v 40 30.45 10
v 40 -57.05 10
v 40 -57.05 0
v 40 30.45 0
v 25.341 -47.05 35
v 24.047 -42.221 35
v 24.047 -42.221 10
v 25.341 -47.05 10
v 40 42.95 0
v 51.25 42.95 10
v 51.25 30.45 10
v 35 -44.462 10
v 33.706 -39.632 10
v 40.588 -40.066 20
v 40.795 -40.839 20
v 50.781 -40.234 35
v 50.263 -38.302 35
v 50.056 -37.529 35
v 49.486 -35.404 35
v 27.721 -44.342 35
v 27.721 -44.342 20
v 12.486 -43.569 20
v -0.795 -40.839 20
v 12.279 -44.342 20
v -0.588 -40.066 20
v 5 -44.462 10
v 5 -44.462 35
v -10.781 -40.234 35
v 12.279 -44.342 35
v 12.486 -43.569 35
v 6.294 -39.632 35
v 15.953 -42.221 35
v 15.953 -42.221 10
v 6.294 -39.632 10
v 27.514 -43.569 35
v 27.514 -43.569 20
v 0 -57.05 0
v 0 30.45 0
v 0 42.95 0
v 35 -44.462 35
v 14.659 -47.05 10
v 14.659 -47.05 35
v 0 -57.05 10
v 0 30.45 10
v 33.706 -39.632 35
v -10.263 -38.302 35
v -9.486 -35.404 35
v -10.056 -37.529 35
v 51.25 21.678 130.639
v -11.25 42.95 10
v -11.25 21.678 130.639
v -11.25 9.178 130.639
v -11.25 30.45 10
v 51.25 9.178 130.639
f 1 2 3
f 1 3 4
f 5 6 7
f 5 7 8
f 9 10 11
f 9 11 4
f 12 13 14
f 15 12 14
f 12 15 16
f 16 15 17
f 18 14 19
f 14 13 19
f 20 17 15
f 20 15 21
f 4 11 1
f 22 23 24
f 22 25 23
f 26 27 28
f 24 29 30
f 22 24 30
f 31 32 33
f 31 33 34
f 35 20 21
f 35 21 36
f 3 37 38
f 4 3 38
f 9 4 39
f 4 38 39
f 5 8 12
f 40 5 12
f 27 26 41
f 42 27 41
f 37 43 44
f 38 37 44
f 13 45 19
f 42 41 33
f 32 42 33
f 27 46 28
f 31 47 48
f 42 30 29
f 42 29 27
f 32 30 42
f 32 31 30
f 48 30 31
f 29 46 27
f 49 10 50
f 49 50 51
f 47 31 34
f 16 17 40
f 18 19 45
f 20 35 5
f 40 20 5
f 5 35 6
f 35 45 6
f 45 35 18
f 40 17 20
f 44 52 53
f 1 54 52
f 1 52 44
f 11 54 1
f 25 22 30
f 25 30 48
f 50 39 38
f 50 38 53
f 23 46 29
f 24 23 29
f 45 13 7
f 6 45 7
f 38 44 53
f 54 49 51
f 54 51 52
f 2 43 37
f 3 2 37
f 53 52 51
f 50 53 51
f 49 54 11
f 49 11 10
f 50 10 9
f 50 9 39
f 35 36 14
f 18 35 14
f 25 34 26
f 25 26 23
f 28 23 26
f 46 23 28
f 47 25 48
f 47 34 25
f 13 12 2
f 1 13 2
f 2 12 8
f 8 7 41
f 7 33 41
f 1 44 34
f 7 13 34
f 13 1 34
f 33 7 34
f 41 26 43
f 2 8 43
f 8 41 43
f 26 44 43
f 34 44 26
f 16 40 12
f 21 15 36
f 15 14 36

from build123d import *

# Parameters (mm, degrees)
F1_DEPTH  = 40
F4_DEPTH  = 62.5
F6_DEPTH  = 12.5
F8_DEPTH  = 25
F10_DEPTH = 5
F12_DEPTH = 15


# Not quite as in the source:
# - a pattern or mirror of a feature is missing from the dataset's text; its kind, count and spacing are read off the source's solid


with BuildPart() as f1:
    # F0 (on Right) → F1 (new body)
    with BuildSketch(Plane.YZ):
        Polygon((-57.0501919146, 0), (0, 0), (42.9498080854, 0), (42.9498080854, 10), (-57.0501919146, 10), align=None)
    extrude(amount=F1_DEPTH)

    # F3 (on offset) → F4 (join)
    with BuildSketch(Plane.YZ.offset(51.25)):
        Polygon((9.1779063212, 130.638949744), (30.4498080854, 10), (42.9498080854, 10), (21.6779063212, 130.638949744), align=None)
    extrude(amount=-F4_DEPTH)

    # F5 (on face) → F6 (join)
    with BuildSketch(Plane(origin=(0, 42.9498080854, 0), x_dir=(-1, 0, 0), z_dir=(0, 1, 0))):
        Polygon((11.25, 10), (0, 10), (0, 0), align=None)
        Polygon((-40, 0), (-40, 10), (-51.25, 10), align=None)
    extrude(amount=-F6_DEPTH)

    # F7 (on face) → F8 (join)
    with BuildSketch(Plane.XY.offset(10)):
        Polygon((15.9533534884, -42.2205627832), (6.2940952255, -39.6323723322), (5, -44.4620014636), (14.6592582629, -47.0501919146), align=None)
        Polygon((33.7059047745, -39.6323723322), (24.0466465116, -42.2205627832), (25.3407417371, -47.0501919146), (35, -44.4620014636), align=None)
    extrude(amount=F8_DEPTH)

    # F9 (on face) → F10 (join)
    with BuildSketch(Plane(origin=(-9.4864686499, -35.4039829857, 0), x_dir=(-0.9659258263, 0.2588190451, 0), z_dir=(0.2588190451, 0.9659258263, 0))):
        Polygon((-16.3372418936, 35), (-16.3372418936, 10), (0, 35), align=None)
    f10 = extrude(amount=-F10_DEPTH)

    # F10_copies: F10 across plane
    add(f10.mirror(Plane(origin=(20, 0, 0), x_dir=(0, 0, 1), z_dir=(1, 0, 0))))

    # F11 (on face) → F12 (cut)
    with BuildSketch(Plane.XY.offset(35)):
        Polygon((12.2791188742, -44.3418831268), (12.4861741103, -43.5691424657), (-10.0558705491, -37.5290198035), (-10.2629257852, -38.3017604645), align=None)
    f12 = extrude(amount=-F12_DEPTH, mode=Mode.SUBTRACT)

    # F12_copies: F12 across plane
    add(f12.mirror(Plane(origin=(20, 0, 0), x_dir=(0, 0, 1), z_dir=(1, 0, 0))), mode=Mode.SUBTRACT)


solid = f1.part
